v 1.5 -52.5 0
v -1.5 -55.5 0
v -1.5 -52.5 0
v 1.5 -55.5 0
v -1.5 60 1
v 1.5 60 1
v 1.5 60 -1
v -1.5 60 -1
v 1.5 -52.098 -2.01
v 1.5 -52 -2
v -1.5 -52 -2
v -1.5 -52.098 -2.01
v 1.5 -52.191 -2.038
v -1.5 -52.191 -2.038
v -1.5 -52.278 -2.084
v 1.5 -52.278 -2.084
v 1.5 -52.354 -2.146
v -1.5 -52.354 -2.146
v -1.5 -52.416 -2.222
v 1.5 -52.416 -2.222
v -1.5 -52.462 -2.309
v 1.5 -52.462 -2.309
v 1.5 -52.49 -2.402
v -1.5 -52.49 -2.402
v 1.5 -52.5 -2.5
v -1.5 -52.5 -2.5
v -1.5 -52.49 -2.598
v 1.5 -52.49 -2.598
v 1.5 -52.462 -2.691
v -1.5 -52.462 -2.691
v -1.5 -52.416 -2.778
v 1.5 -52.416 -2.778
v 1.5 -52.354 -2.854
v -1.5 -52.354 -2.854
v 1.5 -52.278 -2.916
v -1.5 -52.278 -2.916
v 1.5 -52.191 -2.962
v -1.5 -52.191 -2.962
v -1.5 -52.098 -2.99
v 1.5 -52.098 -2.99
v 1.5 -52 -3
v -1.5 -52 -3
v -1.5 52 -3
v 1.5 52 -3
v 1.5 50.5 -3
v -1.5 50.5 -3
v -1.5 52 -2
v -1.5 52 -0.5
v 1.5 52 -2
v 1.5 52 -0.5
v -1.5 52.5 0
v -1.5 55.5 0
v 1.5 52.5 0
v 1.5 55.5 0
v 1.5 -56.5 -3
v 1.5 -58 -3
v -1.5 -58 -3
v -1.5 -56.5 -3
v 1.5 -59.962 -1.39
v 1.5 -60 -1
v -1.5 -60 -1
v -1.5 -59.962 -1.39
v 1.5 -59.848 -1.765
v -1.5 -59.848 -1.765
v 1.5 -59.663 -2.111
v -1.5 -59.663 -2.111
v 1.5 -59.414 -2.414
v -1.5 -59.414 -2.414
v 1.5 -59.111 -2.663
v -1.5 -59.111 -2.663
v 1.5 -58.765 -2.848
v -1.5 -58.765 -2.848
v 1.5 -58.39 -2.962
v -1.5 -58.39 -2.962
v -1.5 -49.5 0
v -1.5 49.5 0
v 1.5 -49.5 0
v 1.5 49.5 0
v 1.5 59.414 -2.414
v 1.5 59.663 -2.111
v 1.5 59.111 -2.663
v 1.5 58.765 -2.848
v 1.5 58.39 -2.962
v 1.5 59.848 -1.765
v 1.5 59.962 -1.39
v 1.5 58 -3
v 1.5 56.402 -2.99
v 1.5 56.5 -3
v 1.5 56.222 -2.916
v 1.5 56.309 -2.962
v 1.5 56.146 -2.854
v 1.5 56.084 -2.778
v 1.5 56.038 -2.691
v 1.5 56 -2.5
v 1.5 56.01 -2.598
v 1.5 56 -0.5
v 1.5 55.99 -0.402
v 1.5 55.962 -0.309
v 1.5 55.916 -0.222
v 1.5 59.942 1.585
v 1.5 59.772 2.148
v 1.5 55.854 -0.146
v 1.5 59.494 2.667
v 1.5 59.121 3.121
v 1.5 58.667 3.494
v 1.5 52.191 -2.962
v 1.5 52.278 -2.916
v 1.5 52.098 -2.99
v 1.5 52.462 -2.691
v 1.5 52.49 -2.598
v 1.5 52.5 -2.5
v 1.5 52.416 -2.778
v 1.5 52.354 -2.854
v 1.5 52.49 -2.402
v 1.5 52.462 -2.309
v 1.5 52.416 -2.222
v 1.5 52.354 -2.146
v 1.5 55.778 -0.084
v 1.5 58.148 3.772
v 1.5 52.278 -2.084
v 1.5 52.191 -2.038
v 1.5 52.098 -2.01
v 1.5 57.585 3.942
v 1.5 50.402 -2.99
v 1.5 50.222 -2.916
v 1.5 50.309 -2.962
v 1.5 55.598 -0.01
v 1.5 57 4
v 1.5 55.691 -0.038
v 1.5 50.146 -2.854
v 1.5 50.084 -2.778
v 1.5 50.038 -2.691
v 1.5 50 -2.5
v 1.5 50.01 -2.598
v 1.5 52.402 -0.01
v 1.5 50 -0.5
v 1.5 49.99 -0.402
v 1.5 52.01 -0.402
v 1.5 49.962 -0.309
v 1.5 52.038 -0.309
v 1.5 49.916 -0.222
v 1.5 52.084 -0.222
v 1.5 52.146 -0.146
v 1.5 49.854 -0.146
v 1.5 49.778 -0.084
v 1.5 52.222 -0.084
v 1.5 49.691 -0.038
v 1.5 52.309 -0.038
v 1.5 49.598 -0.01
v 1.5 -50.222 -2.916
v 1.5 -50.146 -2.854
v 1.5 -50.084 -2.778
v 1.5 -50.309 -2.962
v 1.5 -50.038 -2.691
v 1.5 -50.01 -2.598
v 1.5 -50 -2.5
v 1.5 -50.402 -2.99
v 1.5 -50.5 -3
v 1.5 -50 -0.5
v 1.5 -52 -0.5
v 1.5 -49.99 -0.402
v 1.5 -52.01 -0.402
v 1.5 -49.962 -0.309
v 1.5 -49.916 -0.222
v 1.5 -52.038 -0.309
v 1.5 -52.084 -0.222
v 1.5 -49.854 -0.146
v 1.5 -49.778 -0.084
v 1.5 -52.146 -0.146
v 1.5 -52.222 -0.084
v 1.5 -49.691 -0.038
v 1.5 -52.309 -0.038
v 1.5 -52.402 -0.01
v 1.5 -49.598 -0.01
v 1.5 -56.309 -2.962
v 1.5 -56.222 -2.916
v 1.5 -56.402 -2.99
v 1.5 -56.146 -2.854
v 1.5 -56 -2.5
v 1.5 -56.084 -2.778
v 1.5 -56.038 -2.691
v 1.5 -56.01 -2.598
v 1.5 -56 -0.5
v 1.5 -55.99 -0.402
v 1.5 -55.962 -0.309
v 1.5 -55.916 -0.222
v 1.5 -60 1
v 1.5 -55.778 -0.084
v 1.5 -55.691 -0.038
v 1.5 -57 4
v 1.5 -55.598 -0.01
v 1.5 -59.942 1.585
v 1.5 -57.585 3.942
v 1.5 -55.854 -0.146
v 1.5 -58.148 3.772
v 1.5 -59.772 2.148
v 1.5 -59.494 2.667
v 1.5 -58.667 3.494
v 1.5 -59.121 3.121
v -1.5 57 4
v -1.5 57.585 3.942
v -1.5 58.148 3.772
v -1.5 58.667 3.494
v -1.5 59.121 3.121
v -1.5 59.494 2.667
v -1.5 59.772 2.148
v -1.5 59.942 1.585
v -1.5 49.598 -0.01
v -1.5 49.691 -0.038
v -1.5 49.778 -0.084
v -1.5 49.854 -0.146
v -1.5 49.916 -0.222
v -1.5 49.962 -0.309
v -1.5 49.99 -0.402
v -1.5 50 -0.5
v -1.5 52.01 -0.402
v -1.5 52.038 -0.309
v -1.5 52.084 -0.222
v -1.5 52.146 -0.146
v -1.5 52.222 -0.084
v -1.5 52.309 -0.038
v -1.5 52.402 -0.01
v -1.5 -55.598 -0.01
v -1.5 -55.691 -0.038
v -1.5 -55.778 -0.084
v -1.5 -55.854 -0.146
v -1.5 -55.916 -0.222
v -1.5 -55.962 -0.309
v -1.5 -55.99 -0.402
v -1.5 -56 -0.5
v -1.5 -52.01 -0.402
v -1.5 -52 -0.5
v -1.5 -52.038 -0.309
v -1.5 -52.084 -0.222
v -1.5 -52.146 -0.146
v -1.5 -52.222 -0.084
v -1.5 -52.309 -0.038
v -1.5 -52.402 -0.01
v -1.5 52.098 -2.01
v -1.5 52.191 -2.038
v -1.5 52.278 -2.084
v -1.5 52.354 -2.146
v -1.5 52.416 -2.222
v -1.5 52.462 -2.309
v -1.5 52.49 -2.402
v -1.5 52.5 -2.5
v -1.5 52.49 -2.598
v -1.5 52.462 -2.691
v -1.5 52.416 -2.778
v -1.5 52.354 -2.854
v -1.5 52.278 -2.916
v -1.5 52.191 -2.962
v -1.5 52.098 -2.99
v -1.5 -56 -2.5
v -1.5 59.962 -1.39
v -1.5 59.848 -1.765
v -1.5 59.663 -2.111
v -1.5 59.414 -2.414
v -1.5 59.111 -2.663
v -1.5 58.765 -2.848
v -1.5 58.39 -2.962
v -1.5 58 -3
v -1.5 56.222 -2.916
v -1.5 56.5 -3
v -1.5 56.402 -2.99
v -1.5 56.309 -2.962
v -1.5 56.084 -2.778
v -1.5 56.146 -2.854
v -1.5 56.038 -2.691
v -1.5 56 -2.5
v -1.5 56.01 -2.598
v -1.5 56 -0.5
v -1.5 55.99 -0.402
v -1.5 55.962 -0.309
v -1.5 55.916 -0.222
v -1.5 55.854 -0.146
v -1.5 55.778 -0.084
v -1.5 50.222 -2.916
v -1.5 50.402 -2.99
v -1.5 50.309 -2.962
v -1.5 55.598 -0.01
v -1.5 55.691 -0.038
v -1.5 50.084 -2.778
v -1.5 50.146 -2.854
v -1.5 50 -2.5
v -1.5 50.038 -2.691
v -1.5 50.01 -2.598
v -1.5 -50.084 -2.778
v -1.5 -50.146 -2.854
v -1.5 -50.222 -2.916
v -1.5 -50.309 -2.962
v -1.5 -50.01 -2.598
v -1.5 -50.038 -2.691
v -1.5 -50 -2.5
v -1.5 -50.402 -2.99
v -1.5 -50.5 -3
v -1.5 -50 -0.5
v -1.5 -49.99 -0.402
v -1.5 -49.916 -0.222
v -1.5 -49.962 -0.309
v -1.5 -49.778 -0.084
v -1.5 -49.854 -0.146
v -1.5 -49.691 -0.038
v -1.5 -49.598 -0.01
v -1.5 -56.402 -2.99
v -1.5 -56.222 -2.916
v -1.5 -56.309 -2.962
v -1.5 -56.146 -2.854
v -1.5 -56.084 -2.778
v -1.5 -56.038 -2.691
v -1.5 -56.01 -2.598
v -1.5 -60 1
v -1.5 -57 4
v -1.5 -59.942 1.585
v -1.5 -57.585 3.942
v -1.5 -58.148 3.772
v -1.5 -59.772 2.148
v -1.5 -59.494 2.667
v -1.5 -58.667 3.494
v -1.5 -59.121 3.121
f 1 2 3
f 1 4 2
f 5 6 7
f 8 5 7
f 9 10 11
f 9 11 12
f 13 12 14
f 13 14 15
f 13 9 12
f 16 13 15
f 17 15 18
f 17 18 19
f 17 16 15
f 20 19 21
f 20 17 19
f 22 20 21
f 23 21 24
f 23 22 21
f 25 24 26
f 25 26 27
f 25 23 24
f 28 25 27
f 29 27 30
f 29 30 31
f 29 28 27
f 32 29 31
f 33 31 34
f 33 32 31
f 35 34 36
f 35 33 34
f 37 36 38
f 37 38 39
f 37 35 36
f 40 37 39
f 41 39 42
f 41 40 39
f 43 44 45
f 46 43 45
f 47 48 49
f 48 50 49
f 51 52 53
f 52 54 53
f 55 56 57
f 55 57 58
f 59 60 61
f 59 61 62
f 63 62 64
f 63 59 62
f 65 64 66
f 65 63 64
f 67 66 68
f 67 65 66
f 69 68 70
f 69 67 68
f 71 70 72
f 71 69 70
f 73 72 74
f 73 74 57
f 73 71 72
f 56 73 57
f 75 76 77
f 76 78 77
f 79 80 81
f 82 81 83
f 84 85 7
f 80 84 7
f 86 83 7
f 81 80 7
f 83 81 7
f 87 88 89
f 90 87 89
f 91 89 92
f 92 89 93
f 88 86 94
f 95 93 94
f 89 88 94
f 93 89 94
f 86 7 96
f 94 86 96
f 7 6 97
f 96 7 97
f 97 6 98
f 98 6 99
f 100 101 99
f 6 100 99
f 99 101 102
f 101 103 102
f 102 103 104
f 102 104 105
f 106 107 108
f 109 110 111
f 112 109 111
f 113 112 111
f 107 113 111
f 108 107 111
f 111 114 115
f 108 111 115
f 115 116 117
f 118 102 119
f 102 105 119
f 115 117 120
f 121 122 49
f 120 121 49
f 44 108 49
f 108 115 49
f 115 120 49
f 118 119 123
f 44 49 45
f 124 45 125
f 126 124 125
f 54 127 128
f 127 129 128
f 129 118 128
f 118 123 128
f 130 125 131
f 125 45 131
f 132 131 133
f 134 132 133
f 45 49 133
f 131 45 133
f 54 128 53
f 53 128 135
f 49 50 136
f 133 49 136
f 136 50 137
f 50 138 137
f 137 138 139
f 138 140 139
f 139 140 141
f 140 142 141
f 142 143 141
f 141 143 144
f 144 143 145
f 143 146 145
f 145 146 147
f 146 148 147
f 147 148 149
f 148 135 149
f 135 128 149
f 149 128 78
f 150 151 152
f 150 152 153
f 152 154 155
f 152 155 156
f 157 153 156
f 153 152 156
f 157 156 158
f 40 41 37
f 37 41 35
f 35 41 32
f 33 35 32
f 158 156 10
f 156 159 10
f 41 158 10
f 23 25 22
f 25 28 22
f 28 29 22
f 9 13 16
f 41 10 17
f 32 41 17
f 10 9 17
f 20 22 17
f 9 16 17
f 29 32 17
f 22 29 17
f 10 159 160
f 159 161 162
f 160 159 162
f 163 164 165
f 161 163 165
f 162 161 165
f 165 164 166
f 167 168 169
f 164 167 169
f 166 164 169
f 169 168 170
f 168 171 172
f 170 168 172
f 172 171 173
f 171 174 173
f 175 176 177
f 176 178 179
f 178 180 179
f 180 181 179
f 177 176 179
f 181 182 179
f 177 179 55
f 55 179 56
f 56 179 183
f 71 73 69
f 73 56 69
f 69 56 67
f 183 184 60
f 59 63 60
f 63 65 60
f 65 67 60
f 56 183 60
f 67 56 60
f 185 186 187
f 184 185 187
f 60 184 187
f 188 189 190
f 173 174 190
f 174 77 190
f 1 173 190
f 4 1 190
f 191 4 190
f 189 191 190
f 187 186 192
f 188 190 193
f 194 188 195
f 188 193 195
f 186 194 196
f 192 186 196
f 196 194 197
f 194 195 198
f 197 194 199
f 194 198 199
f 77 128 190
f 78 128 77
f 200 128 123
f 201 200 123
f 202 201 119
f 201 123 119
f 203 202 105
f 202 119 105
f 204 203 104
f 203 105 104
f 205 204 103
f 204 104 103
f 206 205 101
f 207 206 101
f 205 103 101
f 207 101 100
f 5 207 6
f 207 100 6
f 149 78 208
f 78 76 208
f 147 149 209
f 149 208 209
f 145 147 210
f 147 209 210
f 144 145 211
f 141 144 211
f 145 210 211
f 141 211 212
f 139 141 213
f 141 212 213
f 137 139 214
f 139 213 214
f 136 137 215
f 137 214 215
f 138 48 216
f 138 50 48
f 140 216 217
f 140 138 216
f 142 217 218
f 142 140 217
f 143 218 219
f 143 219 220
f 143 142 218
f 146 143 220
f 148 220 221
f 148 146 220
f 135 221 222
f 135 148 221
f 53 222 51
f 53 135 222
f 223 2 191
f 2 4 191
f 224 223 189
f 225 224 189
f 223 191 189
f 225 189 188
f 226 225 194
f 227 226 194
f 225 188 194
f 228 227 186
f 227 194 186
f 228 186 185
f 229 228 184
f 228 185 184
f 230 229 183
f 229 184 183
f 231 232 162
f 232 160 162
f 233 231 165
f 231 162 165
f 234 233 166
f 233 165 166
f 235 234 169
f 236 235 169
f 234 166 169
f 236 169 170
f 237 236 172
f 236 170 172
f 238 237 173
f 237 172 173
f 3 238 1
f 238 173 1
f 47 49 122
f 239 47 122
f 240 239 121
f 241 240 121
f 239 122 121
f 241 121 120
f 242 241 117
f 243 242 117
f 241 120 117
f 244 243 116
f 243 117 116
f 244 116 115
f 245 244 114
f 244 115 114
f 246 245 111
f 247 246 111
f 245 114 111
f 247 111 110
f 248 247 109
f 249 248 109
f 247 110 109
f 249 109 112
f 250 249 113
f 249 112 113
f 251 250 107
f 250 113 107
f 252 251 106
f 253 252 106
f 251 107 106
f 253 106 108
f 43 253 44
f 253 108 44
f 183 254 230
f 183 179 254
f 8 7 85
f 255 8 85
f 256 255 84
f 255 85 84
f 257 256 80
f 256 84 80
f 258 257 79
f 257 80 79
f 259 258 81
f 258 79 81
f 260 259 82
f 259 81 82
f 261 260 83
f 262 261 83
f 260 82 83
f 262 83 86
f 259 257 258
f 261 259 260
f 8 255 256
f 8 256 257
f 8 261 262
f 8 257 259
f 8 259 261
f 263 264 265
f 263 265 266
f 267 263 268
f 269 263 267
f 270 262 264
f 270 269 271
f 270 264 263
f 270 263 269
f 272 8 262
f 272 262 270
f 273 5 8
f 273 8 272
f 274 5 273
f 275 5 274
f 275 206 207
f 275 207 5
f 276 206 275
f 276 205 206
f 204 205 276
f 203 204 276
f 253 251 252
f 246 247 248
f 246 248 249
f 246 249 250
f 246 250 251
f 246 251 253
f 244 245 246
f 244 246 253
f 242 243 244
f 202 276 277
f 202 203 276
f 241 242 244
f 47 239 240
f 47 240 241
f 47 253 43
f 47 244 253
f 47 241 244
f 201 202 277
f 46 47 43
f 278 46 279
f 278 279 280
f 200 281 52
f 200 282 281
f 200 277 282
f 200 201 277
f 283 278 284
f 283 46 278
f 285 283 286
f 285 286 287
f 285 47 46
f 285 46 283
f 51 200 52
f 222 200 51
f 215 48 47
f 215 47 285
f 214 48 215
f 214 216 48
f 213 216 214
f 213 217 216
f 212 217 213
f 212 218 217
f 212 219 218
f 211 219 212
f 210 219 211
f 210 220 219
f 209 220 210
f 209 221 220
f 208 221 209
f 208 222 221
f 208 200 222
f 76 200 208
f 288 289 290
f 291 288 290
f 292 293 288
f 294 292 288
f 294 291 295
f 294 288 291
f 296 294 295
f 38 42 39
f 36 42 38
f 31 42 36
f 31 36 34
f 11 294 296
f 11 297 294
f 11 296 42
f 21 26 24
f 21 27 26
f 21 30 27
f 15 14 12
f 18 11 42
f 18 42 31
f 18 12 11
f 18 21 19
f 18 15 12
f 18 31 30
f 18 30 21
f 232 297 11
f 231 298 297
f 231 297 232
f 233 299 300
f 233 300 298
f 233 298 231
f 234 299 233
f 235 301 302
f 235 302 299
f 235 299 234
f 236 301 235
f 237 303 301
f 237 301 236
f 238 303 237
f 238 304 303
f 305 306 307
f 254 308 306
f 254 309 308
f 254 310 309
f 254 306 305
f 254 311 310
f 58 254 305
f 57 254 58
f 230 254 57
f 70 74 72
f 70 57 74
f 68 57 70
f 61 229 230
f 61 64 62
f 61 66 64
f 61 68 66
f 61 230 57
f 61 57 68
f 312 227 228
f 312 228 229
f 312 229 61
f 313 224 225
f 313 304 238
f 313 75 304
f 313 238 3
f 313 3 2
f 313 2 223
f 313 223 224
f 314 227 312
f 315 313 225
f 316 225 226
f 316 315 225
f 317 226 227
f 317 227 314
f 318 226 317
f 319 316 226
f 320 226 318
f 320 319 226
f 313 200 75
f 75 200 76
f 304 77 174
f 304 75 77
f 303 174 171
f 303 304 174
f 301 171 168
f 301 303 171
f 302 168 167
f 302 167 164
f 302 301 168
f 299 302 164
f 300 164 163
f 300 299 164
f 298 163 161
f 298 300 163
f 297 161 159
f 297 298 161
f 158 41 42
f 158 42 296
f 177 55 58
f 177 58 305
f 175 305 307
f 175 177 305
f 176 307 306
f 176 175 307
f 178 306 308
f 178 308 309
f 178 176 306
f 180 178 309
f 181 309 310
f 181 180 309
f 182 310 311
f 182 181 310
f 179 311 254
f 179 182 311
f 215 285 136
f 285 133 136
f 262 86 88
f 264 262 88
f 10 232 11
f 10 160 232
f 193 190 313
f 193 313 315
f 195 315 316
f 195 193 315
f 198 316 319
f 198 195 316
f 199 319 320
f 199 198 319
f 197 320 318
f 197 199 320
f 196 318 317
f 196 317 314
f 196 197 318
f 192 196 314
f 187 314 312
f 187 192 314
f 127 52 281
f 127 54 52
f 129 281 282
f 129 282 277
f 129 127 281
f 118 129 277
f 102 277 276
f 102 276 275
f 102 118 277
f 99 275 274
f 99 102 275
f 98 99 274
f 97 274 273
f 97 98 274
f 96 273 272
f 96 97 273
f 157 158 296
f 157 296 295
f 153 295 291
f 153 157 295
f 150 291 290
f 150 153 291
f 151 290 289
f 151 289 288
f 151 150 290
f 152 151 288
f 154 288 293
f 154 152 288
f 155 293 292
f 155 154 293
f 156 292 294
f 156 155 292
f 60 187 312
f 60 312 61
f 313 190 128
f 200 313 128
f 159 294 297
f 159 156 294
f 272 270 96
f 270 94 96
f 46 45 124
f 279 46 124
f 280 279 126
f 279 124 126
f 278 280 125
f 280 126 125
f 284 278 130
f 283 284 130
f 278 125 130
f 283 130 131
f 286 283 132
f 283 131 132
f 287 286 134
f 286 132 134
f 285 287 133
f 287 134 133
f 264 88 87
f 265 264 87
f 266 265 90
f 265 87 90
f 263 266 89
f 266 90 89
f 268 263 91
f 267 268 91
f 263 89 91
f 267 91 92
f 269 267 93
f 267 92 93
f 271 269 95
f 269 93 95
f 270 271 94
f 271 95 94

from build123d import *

# Parameters (mm, degrees)
F0_W     = 2
F0_H     = 2
F1_DEPTH = 1.5
F2_R     = 0.5


with BuildPart() as f1:
    # F0 (on Right) → F1 (new body, symmetric)
    with BuildSketch(Plane.YZ):
        with BuildLine():
            Line((-50, 0), (0, 0))
            Line((0, 0), (0, 4))
            Line((0, 4), (-57, 4))
            ThreePointArc((-57, 4), (-59.12132, 3.12132), (-60, 1))
            Line((-60, 1), (-60, 0))
            Line((-60, 0), (-56, 0))
            Line((-56, 0), (-52, 0))
            Line((-52, 0), (-50, 0))
        make_face()
        with Locations((-51, -1)):
            Rectangle(F0_W, F0_H)
        with BuildLine():
            Line((-50, -2.5), (-50, -2))
            Line((-50, -2), (-52, -2))
            Line((-52, -2), (-52, -3))
            Line((-52, -3), (-50.5, -3))
            ThreePointArc((-50.5, -3), (-50.146447, -2.853553), (-50, -2.5))
        make_face()
        with BuildLine():
            Line((-56, -2.5), (-56, 0))
            Line((-56, 0), (-60, 0))
            Line((-60, 0), (-60, -1))
            ThreePointArc((-60, -1), (-59.414214, -2.414214), (-58, -3))
            Line((-58, -3), (-56.5, -3))
            ThreePointArc((-56.5, -3), (-56.146447, -2.853553), (-56, -2.5))
        make_face()
        with BuildLine():
            Line((-52, -3), (-52, -2))
            ThreePointArc((-52, -2), (-52.5, -2.5), (-52, -3))
        make_face()
    extrude(amount=F1_DEPTH, both=True)

    # F2
    f2_edges = [f1.edges().sort_by_distance(p)[0] for p in [
        (0, -56, 0),
        (0, -52, 0),
        (0, -50, 0),
    ]]
    fillet(f2_edges, radius=F2_R)

    # F3: F1 across face


with BuildPart() as f1_1:
    add(f1.part)
    add(f1.part.mirror(Plane(origin=(0, 0, 2), x_dir=(-1, 0, 0), z_dir=(0, 1, 0))))


solid = f1_1.part
